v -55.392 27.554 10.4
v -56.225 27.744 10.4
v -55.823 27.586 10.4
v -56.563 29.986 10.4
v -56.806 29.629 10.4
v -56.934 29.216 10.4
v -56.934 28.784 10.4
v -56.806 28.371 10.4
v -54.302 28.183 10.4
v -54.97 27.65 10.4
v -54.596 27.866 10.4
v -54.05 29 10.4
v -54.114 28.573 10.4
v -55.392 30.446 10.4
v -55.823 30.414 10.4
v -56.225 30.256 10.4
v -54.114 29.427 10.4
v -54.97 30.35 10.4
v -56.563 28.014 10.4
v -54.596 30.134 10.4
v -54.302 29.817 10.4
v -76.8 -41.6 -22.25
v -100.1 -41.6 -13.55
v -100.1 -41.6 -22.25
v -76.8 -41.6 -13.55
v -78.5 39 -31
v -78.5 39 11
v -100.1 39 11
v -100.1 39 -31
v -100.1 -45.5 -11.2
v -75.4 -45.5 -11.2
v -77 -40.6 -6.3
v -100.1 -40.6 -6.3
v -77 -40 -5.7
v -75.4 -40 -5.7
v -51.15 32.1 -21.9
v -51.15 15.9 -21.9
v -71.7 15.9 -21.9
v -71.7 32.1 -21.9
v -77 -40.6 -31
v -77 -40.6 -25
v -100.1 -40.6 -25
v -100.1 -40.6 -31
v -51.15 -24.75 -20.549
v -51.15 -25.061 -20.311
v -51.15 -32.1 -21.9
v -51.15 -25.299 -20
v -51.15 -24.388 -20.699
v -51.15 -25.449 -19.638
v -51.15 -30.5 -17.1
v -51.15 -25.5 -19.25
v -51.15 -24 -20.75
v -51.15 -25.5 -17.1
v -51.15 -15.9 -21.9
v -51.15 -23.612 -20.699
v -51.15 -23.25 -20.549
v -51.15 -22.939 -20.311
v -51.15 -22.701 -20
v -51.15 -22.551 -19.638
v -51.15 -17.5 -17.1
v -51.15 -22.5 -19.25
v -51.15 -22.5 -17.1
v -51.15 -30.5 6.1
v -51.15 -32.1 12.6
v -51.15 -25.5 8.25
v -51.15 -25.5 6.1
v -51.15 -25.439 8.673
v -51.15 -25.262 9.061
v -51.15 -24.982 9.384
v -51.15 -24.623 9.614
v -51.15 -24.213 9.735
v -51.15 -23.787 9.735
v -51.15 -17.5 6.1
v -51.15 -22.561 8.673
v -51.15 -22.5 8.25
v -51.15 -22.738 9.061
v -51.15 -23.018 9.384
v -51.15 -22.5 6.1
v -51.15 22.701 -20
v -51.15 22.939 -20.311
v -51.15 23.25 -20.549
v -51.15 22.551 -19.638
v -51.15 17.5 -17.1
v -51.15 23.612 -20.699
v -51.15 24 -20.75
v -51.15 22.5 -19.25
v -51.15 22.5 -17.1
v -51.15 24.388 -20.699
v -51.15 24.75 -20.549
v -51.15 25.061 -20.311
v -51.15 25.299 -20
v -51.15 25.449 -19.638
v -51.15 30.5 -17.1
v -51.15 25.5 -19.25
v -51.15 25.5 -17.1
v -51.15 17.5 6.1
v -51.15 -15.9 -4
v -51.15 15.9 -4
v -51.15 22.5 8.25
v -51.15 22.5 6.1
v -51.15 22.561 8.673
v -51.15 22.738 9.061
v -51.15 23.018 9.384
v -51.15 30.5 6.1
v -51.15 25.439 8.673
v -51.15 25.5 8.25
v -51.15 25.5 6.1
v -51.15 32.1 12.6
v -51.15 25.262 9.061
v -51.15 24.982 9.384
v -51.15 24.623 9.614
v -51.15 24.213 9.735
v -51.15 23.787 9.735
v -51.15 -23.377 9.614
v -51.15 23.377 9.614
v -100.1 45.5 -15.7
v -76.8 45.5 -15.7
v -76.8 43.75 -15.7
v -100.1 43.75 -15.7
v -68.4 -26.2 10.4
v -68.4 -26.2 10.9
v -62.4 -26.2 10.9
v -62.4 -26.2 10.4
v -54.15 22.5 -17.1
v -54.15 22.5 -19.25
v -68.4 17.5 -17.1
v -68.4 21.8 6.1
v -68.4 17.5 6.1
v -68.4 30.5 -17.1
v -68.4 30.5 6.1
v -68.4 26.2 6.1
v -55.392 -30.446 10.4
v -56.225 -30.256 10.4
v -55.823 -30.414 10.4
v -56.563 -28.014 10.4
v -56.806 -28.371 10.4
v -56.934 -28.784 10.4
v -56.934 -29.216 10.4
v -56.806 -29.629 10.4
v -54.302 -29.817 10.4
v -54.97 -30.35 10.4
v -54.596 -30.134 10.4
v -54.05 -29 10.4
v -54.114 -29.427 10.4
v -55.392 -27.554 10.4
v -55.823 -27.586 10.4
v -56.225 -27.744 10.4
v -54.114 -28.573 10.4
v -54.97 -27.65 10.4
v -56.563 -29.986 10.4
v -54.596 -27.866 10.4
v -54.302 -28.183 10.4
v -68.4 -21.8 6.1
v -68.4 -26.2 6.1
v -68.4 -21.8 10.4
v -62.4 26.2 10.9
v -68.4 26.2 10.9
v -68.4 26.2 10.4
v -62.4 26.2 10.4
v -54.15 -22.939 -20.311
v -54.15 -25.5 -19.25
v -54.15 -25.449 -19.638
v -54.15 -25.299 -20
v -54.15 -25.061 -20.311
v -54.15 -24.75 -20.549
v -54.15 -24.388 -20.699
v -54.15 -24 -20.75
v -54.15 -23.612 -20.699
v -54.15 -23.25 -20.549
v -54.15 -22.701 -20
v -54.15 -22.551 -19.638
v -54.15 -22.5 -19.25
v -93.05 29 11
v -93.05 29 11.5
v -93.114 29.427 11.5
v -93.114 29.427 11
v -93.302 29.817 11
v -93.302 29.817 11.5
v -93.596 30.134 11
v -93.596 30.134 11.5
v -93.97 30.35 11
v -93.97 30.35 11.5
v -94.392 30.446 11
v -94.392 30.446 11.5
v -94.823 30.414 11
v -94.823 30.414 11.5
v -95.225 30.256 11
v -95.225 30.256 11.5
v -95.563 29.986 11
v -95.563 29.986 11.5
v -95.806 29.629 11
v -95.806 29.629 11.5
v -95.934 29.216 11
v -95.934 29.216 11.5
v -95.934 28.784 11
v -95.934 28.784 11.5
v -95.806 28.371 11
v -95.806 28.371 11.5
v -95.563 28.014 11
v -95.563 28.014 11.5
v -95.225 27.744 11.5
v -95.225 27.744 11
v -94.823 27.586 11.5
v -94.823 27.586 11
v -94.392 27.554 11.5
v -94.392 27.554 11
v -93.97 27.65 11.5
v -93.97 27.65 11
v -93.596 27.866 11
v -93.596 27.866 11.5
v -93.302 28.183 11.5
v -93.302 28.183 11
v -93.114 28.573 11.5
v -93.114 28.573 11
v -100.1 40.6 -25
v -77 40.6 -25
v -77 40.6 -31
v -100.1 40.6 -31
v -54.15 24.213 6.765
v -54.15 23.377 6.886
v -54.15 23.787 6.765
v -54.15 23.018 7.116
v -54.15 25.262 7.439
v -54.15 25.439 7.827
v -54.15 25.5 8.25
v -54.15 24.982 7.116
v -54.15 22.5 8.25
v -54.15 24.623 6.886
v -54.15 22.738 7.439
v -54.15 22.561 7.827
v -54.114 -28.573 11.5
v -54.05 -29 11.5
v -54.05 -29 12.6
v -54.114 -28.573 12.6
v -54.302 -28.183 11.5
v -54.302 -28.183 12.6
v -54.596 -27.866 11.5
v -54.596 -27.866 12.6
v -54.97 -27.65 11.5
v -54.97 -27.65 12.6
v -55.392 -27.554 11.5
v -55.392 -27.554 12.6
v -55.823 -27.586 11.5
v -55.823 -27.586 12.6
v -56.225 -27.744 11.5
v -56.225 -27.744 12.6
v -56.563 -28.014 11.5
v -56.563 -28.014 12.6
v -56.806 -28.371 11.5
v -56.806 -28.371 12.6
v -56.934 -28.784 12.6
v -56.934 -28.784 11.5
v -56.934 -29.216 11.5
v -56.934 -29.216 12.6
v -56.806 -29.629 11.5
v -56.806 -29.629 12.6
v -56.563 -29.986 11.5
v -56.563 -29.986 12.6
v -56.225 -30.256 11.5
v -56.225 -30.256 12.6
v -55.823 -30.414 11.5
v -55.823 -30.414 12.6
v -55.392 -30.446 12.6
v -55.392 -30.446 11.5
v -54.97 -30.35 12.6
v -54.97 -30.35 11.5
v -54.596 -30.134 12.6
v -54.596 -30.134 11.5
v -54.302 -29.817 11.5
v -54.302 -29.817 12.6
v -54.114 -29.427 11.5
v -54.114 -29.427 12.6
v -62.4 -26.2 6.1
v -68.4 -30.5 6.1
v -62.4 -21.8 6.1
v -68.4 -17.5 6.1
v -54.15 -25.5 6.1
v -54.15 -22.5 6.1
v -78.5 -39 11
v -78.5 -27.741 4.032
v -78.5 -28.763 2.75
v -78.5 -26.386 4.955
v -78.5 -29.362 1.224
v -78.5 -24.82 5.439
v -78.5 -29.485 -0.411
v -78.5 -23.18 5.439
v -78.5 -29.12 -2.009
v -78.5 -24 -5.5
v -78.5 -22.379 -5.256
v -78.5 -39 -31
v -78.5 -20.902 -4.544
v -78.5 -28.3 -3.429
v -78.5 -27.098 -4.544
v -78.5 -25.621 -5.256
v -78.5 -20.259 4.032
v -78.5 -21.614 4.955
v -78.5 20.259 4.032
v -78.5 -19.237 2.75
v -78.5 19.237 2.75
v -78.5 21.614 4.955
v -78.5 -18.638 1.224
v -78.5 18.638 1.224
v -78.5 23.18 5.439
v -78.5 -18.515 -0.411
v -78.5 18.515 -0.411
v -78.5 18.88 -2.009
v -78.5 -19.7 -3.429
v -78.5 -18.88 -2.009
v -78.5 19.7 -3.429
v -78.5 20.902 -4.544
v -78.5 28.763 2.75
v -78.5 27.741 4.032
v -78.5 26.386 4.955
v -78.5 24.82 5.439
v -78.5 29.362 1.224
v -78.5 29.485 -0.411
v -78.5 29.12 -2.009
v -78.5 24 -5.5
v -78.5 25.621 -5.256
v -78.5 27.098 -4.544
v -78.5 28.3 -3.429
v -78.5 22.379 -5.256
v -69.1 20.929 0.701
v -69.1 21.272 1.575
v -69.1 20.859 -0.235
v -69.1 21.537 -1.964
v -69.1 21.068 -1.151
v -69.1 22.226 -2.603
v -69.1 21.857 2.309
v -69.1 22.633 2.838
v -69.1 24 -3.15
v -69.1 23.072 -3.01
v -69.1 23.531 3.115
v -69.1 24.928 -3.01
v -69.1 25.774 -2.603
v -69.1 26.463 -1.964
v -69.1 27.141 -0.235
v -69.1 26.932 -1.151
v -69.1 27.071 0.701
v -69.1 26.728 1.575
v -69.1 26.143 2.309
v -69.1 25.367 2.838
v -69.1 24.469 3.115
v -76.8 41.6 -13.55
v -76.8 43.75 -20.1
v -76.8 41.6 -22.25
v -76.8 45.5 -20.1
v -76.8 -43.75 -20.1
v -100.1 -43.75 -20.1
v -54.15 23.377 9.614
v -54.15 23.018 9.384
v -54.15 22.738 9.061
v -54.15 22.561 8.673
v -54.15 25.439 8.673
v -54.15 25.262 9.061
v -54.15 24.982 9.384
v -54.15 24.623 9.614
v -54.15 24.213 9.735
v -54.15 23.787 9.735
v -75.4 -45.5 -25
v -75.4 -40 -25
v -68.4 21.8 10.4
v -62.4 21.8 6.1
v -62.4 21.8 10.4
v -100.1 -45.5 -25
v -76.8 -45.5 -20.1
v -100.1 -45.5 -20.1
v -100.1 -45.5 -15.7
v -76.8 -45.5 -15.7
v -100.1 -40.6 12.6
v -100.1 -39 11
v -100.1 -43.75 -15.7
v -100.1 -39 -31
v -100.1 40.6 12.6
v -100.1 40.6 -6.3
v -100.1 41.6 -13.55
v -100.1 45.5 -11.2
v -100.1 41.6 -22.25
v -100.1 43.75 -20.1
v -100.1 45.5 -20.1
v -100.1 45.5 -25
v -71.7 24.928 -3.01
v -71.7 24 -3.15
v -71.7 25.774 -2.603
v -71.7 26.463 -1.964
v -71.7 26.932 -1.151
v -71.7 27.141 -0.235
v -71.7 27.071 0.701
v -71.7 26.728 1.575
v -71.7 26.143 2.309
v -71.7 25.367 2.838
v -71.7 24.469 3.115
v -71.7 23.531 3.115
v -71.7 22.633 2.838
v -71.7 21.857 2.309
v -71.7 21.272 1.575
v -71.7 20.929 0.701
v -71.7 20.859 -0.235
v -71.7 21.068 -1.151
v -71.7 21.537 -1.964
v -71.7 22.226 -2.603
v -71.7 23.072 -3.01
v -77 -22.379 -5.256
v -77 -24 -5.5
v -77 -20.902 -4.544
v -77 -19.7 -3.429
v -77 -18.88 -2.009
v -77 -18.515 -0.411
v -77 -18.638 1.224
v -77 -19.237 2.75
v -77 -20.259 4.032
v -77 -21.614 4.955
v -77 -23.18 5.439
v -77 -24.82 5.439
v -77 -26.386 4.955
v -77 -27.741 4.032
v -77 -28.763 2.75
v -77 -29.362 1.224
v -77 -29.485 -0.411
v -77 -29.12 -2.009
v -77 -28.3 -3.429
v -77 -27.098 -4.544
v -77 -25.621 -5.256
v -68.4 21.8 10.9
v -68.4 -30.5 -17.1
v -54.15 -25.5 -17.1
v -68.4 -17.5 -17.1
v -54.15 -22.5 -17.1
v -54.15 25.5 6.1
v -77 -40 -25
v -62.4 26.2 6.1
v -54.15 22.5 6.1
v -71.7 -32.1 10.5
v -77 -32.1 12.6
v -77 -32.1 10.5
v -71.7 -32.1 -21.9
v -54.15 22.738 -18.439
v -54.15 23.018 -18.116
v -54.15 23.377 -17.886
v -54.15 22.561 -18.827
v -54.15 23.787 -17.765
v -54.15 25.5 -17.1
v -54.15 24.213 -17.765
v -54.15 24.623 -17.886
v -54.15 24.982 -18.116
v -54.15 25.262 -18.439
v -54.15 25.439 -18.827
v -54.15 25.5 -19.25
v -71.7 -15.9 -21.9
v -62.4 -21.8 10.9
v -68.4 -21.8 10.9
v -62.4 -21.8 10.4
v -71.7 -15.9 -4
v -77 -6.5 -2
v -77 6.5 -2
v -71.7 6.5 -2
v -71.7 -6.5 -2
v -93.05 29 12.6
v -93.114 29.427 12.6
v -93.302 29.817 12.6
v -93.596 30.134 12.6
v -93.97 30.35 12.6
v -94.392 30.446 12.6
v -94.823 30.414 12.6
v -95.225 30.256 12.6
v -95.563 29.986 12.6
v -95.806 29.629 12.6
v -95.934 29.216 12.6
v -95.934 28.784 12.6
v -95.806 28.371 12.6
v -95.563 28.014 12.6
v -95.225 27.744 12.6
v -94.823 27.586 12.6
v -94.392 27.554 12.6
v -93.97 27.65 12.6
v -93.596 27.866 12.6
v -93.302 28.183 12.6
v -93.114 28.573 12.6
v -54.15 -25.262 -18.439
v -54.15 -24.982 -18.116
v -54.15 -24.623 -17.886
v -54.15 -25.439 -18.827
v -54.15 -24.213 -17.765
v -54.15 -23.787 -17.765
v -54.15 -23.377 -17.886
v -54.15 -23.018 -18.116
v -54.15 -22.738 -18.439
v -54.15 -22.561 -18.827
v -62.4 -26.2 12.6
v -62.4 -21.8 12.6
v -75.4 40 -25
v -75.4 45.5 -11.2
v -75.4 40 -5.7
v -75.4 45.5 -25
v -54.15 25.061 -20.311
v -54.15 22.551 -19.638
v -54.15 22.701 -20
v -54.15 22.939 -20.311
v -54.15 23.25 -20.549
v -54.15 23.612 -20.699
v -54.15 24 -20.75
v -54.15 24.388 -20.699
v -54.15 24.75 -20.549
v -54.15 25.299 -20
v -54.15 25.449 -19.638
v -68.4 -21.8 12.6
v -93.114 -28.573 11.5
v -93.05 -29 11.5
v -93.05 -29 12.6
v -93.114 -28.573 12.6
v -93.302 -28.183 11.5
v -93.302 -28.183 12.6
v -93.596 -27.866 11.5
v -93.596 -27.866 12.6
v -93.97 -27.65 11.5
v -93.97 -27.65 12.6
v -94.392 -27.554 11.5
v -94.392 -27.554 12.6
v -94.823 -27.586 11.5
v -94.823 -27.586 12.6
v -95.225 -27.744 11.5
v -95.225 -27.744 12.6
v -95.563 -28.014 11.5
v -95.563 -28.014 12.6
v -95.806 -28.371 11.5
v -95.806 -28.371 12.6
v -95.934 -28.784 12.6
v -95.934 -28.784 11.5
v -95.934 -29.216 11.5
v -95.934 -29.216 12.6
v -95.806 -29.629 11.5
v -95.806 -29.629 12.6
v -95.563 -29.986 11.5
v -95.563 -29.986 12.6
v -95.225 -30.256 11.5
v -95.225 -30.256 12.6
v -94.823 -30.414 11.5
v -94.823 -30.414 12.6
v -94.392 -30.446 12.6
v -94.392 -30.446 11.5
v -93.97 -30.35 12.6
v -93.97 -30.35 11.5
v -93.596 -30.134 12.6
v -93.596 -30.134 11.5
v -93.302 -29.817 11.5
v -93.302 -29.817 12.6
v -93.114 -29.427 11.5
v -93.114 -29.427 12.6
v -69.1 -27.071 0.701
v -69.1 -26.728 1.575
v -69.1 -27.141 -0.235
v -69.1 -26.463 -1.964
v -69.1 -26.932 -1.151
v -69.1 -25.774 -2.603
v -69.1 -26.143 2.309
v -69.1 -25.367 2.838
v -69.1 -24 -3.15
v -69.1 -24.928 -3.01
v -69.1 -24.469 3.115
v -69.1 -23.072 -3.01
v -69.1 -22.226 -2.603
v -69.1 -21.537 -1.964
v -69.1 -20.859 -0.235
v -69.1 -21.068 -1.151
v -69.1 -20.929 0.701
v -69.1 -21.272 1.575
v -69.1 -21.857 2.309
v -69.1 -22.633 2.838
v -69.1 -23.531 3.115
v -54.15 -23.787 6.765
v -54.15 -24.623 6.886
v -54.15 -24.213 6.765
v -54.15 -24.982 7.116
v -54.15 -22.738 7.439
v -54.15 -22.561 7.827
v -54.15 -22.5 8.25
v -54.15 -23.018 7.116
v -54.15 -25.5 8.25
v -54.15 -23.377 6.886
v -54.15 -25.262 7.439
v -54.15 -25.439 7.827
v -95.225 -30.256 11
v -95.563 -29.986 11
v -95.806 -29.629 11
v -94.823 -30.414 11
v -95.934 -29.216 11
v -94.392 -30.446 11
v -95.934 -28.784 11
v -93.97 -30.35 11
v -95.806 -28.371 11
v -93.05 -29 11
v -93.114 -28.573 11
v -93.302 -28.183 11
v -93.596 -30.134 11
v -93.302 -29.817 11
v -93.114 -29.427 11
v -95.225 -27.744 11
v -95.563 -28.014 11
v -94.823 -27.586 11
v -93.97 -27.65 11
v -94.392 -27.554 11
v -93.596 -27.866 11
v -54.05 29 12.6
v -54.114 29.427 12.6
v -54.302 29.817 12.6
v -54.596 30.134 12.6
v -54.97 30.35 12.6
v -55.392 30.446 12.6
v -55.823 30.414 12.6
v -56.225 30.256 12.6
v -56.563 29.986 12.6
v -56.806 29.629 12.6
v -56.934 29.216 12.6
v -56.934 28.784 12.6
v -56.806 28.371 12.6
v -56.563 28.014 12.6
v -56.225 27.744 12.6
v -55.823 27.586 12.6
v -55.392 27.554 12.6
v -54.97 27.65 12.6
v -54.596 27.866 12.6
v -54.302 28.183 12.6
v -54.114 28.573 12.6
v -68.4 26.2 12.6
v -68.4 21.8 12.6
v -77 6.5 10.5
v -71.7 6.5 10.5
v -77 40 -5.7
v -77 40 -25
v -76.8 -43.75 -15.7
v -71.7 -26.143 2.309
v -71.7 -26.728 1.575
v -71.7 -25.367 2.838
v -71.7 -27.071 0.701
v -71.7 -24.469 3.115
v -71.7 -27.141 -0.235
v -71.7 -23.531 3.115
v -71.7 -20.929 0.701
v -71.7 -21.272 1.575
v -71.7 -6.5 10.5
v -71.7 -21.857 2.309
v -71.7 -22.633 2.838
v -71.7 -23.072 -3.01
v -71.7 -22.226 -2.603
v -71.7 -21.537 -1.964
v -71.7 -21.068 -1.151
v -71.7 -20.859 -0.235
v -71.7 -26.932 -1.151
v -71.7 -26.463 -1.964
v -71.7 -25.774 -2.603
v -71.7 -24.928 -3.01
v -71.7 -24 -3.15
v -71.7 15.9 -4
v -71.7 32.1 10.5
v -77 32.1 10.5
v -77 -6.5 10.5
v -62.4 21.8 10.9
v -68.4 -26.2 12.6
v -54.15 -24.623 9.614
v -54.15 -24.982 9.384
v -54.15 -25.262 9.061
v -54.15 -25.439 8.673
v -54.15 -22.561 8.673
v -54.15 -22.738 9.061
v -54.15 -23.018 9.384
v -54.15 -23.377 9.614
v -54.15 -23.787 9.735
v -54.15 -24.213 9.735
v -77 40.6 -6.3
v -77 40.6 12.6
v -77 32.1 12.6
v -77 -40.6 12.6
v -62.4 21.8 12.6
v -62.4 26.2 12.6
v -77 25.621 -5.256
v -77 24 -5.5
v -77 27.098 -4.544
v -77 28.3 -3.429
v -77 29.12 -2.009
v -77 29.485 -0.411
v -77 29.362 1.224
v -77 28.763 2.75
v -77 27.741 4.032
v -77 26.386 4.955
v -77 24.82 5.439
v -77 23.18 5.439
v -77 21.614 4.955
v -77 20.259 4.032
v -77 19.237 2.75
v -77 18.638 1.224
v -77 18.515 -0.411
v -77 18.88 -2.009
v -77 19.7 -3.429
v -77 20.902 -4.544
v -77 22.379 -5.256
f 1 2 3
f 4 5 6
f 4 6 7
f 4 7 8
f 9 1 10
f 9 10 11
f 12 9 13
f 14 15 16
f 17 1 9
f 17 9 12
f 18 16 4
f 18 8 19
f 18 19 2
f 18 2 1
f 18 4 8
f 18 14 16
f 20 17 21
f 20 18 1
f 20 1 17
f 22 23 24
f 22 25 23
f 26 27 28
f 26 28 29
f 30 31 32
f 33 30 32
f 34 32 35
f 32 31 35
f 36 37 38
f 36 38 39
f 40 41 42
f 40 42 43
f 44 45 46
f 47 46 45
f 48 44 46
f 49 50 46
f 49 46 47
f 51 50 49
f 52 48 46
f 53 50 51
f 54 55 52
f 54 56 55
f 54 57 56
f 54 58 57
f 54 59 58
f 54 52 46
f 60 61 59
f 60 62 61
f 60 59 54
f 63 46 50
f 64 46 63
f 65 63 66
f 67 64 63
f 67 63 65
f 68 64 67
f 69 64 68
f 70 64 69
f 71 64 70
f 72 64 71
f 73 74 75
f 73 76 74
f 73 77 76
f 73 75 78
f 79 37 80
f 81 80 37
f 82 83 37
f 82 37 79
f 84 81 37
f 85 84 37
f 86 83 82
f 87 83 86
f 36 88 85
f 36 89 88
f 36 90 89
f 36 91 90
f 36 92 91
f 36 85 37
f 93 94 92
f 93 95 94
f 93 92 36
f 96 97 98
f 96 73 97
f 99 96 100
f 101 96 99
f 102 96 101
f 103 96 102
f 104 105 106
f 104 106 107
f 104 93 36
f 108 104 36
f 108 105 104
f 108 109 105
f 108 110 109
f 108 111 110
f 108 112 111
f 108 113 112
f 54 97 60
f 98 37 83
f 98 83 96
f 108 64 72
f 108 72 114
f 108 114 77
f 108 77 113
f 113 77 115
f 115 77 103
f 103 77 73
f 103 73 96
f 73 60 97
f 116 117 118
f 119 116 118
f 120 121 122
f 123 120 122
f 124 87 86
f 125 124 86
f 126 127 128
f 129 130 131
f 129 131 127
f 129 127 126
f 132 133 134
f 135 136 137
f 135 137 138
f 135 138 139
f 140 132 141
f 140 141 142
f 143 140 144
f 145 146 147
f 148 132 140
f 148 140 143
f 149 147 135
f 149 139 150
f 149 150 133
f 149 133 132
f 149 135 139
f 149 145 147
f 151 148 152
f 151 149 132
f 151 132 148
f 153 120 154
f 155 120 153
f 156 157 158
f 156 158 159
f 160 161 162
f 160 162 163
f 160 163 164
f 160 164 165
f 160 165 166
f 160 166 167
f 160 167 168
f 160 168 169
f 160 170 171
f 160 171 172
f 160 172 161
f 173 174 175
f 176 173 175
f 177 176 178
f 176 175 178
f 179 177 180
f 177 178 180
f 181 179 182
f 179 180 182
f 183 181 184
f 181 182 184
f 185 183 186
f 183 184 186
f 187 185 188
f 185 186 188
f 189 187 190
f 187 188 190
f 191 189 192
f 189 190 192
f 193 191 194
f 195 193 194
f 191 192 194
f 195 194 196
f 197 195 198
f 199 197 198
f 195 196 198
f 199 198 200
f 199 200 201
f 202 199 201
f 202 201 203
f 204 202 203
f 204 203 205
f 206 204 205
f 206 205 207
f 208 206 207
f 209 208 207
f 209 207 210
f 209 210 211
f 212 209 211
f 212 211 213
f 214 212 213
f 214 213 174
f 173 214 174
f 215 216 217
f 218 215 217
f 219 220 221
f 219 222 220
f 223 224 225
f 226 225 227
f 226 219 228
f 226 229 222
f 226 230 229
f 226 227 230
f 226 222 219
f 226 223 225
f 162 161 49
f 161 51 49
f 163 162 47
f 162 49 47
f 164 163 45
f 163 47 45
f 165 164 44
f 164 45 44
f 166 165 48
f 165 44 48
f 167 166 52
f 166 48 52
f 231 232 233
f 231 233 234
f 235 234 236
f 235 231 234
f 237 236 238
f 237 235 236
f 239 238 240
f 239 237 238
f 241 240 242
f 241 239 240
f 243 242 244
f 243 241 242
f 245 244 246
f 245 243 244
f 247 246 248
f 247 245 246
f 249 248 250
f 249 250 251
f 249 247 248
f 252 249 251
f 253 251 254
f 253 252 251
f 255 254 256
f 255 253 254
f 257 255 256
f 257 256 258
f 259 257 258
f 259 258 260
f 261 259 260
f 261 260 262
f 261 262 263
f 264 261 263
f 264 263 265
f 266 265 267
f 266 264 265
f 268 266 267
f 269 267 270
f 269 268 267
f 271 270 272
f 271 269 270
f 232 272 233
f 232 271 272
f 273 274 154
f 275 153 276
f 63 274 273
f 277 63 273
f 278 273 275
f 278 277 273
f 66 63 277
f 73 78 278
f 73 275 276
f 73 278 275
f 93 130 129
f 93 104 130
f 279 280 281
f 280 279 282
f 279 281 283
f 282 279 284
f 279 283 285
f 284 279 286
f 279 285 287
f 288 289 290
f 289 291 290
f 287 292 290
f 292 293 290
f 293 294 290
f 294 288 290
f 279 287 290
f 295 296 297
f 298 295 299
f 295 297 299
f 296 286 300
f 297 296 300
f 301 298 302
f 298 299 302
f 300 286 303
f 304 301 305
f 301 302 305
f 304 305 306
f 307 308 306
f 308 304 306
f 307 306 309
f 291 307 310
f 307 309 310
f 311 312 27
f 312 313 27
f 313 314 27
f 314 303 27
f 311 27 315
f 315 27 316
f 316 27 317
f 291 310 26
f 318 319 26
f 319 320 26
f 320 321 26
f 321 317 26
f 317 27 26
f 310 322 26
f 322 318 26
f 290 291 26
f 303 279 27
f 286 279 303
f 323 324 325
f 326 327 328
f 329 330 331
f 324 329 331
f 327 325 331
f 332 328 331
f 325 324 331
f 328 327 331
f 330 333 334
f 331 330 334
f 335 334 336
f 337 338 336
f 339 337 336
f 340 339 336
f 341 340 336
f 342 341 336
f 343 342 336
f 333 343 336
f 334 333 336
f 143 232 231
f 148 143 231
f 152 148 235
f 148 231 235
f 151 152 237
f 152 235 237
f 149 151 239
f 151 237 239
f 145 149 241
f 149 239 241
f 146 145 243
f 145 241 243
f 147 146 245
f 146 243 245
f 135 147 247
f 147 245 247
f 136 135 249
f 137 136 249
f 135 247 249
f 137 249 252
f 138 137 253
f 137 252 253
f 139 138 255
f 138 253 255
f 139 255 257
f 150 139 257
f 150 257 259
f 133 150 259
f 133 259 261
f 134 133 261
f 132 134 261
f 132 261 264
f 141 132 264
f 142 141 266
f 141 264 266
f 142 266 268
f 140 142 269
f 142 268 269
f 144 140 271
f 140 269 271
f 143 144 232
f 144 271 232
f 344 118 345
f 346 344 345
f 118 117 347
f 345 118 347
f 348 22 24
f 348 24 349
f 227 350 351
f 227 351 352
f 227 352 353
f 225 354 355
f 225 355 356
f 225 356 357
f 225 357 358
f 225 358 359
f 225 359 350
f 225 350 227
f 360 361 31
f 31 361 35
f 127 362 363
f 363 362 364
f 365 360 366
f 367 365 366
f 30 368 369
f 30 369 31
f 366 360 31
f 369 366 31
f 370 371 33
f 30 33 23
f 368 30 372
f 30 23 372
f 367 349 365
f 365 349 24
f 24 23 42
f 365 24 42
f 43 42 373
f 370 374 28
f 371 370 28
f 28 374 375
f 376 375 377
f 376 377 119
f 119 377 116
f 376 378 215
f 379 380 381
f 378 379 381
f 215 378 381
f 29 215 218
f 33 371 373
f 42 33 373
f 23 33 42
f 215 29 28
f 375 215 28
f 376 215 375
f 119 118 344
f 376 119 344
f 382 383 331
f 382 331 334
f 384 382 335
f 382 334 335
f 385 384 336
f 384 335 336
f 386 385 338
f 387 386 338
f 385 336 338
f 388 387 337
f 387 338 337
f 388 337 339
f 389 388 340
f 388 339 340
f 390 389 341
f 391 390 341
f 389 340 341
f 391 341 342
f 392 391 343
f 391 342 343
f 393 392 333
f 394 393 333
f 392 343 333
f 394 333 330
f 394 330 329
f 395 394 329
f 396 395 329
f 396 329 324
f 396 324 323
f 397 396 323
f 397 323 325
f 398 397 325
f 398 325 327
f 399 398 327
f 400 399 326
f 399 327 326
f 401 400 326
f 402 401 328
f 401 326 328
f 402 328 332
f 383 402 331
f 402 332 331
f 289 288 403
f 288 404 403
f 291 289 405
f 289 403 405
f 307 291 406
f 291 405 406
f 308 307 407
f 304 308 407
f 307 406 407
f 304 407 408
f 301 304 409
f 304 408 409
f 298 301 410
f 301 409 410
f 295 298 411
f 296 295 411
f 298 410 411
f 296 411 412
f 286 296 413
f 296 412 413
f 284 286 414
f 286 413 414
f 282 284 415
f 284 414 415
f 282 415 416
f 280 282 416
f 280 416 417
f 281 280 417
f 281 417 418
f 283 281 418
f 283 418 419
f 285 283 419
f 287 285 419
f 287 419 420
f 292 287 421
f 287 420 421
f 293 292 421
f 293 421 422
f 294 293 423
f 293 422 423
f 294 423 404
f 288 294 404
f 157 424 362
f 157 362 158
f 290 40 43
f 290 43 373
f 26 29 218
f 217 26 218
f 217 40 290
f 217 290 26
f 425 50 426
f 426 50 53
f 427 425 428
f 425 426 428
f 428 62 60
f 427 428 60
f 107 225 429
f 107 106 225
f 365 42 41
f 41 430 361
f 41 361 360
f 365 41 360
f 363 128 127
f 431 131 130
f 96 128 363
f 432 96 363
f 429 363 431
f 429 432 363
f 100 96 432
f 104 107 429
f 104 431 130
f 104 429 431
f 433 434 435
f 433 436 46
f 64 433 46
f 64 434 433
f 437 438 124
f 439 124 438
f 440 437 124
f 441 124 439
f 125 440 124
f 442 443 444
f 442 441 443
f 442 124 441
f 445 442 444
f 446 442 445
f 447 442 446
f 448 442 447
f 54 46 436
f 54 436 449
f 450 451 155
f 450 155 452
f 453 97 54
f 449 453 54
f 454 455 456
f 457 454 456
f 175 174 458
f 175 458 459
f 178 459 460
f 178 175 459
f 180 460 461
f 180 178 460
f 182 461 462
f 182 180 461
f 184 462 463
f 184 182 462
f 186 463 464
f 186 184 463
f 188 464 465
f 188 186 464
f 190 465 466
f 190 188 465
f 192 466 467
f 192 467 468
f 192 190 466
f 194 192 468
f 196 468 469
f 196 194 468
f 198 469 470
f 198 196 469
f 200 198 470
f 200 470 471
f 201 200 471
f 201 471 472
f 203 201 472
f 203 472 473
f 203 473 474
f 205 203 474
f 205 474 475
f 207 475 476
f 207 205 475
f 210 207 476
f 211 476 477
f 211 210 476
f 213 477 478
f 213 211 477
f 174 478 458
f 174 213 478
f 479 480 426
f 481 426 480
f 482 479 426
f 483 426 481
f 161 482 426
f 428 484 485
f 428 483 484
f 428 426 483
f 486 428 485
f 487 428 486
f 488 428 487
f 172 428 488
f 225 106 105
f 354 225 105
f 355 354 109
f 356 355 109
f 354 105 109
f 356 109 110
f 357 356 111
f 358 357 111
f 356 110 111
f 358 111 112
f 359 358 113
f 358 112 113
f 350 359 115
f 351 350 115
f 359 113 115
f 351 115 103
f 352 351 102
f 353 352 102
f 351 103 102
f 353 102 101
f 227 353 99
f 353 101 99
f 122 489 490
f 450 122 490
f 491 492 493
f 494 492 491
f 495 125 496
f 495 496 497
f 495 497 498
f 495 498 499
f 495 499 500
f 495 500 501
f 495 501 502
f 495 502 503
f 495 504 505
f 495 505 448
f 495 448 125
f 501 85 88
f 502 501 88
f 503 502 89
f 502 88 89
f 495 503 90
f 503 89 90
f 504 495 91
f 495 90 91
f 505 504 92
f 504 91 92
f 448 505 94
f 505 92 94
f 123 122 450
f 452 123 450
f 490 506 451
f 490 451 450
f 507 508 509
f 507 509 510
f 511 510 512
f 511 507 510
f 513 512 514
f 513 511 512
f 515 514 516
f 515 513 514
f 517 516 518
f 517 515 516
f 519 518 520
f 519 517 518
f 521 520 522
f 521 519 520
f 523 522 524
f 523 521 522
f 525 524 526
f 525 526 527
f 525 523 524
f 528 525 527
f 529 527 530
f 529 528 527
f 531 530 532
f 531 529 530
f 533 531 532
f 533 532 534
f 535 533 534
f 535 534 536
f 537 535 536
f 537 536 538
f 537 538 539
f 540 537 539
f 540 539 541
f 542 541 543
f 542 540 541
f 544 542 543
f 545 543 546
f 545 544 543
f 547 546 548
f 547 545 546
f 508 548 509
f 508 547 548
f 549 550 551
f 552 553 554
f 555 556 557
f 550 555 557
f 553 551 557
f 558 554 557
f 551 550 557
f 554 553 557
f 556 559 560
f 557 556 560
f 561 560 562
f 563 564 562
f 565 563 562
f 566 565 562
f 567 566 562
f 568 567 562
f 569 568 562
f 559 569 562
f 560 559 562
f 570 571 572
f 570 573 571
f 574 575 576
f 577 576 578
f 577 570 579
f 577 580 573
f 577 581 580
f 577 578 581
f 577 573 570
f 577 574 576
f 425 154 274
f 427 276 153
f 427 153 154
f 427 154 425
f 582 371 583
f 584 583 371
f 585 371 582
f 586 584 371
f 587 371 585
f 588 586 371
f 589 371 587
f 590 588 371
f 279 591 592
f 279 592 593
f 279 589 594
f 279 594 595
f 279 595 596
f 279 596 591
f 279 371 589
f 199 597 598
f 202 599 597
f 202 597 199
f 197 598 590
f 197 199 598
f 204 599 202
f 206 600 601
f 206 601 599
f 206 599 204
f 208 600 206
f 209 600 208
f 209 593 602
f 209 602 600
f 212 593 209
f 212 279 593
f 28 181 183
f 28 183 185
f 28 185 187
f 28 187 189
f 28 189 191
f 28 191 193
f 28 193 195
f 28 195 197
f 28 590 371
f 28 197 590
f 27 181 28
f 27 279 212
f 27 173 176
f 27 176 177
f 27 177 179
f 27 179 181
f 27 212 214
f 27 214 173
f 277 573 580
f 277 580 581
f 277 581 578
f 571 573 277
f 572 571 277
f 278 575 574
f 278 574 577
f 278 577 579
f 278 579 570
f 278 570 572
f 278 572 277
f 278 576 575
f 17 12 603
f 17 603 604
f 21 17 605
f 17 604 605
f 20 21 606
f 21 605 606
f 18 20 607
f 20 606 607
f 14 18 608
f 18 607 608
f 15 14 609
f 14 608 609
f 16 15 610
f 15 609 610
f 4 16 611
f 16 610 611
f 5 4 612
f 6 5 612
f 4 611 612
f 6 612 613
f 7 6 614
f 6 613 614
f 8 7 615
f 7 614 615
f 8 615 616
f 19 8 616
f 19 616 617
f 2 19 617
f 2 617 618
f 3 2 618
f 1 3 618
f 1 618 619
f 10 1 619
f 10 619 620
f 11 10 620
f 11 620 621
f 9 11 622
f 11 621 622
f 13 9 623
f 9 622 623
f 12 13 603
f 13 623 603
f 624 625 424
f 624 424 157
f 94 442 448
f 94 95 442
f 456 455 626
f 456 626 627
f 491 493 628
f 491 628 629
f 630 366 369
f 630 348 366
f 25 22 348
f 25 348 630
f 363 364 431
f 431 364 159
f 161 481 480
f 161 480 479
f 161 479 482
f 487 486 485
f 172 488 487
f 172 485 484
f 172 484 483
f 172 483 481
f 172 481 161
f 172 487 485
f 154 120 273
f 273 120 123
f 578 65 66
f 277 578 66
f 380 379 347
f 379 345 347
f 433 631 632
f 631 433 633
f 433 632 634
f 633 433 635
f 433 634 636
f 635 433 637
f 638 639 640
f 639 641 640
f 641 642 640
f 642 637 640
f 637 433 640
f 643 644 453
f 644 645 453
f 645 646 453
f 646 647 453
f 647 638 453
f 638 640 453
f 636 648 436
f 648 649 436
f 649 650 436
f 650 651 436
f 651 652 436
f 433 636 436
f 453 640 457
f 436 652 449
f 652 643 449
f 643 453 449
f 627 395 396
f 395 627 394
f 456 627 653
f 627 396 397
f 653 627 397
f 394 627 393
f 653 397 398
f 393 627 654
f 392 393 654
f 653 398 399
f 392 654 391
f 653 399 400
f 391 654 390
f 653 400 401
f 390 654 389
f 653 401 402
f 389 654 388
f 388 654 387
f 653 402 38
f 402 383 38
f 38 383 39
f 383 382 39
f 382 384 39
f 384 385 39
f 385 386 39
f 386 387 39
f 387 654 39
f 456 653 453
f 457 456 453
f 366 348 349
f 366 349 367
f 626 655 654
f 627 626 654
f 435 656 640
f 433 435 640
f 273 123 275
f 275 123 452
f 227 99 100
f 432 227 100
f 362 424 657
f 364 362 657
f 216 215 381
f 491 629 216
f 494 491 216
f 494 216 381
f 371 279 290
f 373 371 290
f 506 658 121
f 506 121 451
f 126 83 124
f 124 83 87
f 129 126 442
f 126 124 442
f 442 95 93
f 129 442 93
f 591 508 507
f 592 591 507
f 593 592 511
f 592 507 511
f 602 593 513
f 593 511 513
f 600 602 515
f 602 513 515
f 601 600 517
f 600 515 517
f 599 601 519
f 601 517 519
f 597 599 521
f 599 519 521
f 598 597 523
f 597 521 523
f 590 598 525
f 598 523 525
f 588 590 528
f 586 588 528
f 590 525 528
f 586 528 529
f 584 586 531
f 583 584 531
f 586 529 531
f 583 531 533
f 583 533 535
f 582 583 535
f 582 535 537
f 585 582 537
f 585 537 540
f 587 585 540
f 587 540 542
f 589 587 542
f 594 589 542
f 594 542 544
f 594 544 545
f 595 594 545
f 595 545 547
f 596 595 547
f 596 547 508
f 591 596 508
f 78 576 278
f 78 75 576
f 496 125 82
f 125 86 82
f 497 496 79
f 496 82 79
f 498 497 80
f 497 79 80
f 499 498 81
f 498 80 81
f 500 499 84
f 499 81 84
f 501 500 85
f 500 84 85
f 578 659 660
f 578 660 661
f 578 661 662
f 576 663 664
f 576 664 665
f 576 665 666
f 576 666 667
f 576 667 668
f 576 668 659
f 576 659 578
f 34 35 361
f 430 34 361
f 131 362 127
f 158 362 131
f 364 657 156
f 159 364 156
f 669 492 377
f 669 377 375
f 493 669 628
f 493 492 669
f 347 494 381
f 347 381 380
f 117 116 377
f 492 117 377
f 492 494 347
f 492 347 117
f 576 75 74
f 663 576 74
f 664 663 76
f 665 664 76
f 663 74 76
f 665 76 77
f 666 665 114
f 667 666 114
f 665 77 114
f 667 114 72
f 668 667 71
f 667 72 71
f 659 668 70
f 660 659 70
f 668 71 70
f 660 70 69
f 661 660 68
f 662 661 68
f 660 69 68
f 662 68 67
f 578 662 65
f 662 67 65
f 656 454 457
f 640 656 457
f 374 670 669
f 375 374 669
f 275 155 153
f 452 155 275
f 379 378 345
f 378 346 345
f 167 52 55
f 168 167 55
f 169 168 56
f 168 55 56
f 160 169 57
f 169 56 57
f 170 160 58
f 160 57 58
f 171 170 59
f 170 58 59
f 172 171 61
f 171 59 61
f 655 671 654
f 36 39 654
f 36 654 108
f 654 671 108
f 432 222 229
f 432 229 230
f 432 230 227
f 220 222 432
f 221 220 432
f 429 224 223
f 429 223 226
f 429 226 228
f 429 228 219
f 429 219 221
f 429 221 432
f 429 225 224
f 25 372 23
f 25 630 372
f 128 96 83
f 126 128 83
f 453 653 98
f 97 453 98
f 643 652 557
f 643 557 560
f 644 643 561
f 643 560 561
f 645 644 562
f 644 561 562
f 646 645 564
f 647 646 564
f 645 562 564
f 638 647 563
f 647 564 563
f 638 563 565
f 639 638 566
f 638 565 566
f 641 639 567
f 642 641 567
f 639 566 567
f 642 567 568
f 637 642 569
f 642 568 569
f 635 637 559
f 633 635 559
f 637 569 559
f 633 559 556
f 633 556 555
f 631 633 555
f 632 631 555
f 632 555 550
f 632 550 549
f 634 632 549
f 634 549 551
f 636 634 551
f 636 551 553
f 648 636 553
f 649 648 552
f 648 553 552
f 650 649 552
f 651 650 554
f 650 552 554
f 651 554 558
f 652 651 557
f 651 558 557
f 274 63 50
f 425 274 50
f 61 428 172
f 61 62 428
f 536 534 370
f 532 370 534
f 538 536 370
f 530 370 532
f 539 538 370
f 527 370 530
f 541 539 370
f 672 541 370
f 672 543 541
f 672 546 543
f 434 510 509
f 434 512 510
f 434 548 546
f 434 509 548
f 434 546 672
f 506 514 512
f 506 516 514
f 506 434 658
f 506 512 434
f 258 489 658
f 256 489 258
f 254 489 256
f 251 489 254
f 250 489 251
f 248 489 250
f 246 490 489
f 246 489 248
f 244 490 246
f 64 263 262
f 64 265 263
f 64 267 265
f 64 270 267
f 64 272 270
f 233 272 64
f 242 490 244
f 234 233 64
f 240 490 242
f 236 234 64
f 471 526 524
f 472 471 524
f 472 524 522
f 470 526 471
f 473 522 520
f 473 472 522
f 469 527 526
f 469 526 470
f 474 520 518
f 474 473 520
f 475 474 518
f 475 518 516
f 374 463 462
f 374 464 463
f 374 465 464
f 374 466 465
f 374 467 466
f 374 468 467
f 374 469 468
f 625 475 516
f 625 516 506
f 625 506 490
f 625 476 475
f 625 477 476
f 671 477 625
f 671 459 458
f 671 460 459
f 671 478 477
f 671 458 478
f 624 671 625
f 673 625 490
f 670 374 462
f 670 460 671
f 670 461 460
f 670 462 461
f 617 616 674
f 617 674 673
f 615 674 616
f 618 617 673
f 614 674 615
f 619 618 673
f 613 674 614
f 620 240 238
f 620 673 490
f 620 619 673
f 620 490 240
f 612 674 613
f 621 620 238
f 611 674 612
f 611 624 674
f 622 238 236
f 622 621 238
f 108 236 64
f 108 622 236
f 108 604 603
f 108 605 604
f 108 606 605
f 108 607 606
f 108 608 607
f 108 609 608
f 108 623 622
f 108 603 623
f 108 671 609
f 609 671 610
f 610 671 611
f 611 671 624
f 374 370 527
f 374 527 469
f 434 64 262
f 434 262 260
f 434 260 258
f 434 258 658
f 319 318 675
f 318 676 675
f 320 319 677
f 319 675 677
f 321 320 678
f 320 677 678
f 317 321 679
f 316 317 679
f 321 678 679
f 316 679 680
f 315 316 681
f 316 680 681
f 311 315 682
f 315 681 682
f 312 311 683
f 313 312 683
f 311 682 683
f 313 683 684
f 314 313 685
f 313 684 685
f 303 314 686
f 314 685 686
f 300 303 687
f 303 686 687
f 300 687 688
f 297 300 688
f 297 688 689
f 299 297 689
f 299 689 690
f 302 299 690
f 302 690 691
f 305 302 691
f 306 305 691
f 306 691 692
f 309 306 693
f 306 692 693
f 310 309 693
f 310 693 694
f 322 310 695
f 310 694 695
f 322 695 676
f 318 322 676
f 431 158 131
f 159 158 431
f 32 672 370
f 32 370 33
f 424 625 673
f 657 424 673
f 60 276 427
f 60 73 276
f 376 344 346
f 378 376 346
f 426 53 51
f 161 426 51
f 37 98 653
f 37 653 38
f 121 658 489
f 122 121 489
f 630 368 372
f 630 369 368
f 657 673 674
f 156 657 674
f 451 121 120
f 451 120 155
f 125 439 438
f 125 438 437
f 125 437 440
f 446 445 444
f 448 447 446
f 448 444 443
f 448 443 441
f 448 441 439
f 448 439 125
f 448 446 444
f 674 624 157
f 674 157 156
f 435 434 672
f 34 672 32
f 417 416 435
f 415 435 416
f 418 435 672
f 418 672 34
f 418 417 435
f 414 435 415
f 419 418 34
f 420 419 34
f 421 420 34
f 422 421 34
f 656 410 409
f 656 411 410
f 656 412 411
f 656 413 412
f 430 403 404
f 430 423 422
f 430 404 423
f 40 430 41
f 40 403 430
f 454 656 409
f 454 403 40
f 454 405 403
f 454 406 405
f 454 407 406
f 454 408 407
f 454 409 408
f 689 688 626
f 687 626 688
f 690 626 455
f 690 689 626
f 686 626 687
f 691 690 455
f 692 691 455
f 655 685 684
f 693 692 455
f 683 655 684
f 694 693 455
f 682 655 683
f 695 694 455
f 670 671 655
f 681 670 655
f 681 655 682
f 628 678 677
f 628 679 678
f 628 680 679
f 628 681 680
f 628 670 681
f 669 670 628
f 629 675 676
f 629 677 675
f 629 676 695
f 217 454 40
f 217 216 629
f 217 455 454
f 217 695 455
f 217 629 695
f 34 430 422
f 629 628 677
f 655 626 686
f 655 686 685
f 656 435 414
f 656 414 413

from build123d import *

# Parameters (mm, degrees)
BOSS_EXTRUDE1_START = -88.55
SKETCH1_W           = 43.6
SKETCH1_H           = 81.2
BOSS_EXTRUDE1_DEPTH = 11.55
BOSS_EXTRUDE2_START = 3.45
SKETCH2_W           = 20.55
SKETCH2_H           = 33
BOSS_EXTRUDE2_DEPTH = 7.45
BOSS_EXTRUDE3_START = 4.45
SKETCH3_W           = 6.3
SKETCH3_H           = 13
BOSS_EXTRUDE3_DEPTH = 6.45
BOSS_EXTRUDE4_START = 11.55
SKETCH4_W           = 26.85
SKETCH4_H           = 64.2
BOSS_EXTRUDE4_DEPTH = 1.05
BOSS_EXTRUDE5_START = -61.425
SKETCH5_W           = 32.8
SKETCH5_H           = 16.2
BOSS_EXTRUDE5_DEPTH = 10.275
BOSS_EXTRUDE6_START = -87.75
BOSS_EXTRUDE6_DEPTH = 12.35
BOSS_EXTRUDE7_START = -61.425
SKETCH7_W           = 32.8
SKETCH7_H           = 16.2
BOSS_EXTRUDE7_DEPTH = 10.275
BOSS_EXTRUDE8_START = -87.75
BOSS_EXTRUDE8_DEPTH = 12.35
CUT_EXTRUDE1_START  = -89.3
SKETCH9_W           = 43
SKETCH9_H           = 78
CUT_EXTRUDE1_DEPTH  = 10.8
CUT_EXTRUDE2_START  = 11.5
SKETCH10_R          = 1.45
CUT_EXTRUDE2_DEPTH  = 1.1
CUT_EXTRUDE3_START  = -88.45
CUT_EXTRUDE3_DEPTH  = 11.65
CUT_EXTRUDE4_START  = -59.775
SKETCH12_W          = 23.2
SKETCH12_H          = 13
CUT_EXTRUDE4_DEPTH  = 8.625
CUT_EXTRUDE5_START  = -52.65
SKETCH13_R          = 1.5
CUT_EXTRUDE5_DEPTH  = 1.5
CUT_EXTRUDE6_START  = -52.65
SKETCH14_W          = 2.15
SKETCH14_H          = 3
CUT_EXTRUDE6_DEPTH  = 1.5
CUT_EXTRUDE7_START  = -52.65
SKETCH15_R          = 1.5
CUT_EXTRUDE7_DEPTH  = 1.5
CUT_EXTRUDE8_START  = -52.65
SKETCH16_W          = 2.15
SKETCH16_H          = 3
CUT_EXTRUDE8_DEPTH  = 1.5
CUT_EXTRUDE9_START  = -70.4
SKETCH17_R          = 3.15
CUT_EXTRUDE9_DEPTH  = 1.3
CUT_EXTRUDE10_START = 8.5
SKETCH18_W          = 6
SKETCH18_H          = 4.4
CUT_EXTRUDE10_DEPTH = 2.4
CUT_EXTRUDE11_START = 11.5
SKETCH19_W          = 6
SKETCH19_H          = 4.4
CUT_EXTRUDE11_DEPTH = 1.1
CUT_EXTRUDE12_START = -77.75
SKETCH20_R          = 5.5
CUT_EXTRUDE12_DEPTH = 0.75
CUT_EXTRUDE13_START = -88.45
CUT_EXTRUDE13_DEPTH = 11.65
CUT_EXTRUDE14_START = -59.775
SKETCH22_W          = 23.2
SKETCH22_H          = 13
CUT_EXTRUDE14_DEPTH = 8.625
CUT_EXTRUDE15_START = -52.65
SKETCH23_R          = 1.5
CUT_EXTRUDE15_DEPTH = 1.5
CUT_EXTRUDE16_START = -52.65
SKETCH24_W          = 2.15
SKETCH24_H          = 3
CUT_EXTRUDE16_DEPTH = 1.5
CUT_EXTRUDE17_START = -52.65
SKETCH25_R          = 1.5
CUT_EXTRUDE17_DEPTH = 1.5
CUT_EXTRUDE18_START = -52.65
SKETCH26_W          = 2.15
SKETCH26_H          = 3
CUT_EXTRUDE18_DEPTH = 1.5
CUT_EXTRUDE19_START = -70.4
SKETCH27_R          = 3.15
CUT_EXTRUDE19_DEPTH = 1.3
CUT_EXTRUDE20_START = 8.5
SKETCH28_W          = 6
SKETCH28_H          = 4.4
CUT_EXTRUDE20_DEPTH = 2.4
CUT_EXTRUDE21_START = 11.5
SKETCH29_W          = 6
SKETCH29_H          = 4.4
CUT_EXTRUDE21_DEPTH = 1.1
CUT_EXTRUDE22_START = -77.75
SKETCH30_R          = 5.5
CUT_EXTRUDE22_DEPTH = 0.75


with BuildPart() as part:
    # Sketch1 → Boss-Extrude1 (new, symmetric)
    with BuildSketch(Plane(origin=(0, 0, 0), x_dir=(0, 0, -1), z_dir=(1, 0, 0)).offset(BOSS_EXTRUDE1_START)):
        with Locations((9.2, 0)):
            Rectangle(SKETCH1_W, SKETCH1_H)
    extrude(amount=BOSS_EXTRUDE1_DEPTH, both=True)



with BuildPart() as body_2:
    # Sketch2 → Boss-Extrude2 (new, symmetric)
    with BuildSketch(Plane.XY.offset(BOSS_EXTRUDE2_START)):
        with Locations((-61.425, 0)):
            Rectangle(SKETCH2_W, SKETCH2_H)
    extrude(amount=BOSS_EXTRUDE2_DEPTH, both=True)


with BuildPart() as part_1:
    add(part.part)

    add(body_2.part)  # Boss-Extrude3 merges body 2
    # Sketch3 → Boss-Extrude3 (add, symmetric)
    with BuildSketch(Plane.XY.offset(BOSS_EXTRUDE3_START)):
        with Locations((-74.85, 0)):
            Rectangle(SKETCH3_W, SKETCH3_H)
    extrude(amount=BOSS_EXTRUDE3_DEPTH, both=True)

    # Sketch4 → Boss-Extrude4 (add, symmetric)
    with BuildSketch(Plane.XY.offset(BOSS_EXTRUDE4_START)):
        with Locations((-64.575, 0)):
            Rectangle(SKETCH4_W, SKETCH4_H)
    extrude(amount=BOSS_EXTRUDE4_DEPTH, both=True)

    # Sketch5 → Boss-Extrude5 (add, symmetric)
    with BuildSketch(Plane(origin=(0, 0, 0), x_dir=(0, 0, -1), z_dir=(1, 0, 0)).offset(BOSS_EXTRUDE5_START)):
        with Locations((5.5, 24)):
            Rectangle(SKETCH5_W, SKETCH5_H)
    extrude(amount=BOSS_EXTRUDE5_DEPTH, both=True)

    # Sketch6 → Boss-Extrude6 (add, symmetric)
    with BuildSketch(Plane(origin=(0, 0, 0), x_dir=(0, 0, -1), z_dir=(1, 0, 0)).offset(BOSS_EXTRUDE6_START)):
        Polygon((25, 40), (25, 45.5), (11.2, 45.5), (5.7, 40), align=None)
    extrude(amount=BOSS_EXTRUDE6_DEPTH, both=True)

    # Sketch7 → Boss-Extrude7 (add, symmetric)
    with BuildSketch(Plane(origin=(0, 0, 0), x_dir=(0, 0, -1), z_dir=(1, 0, 0)).offset(BOSS_EXTRUDE7_START)):
        with Locations((5.5, -24)):
            Rectangle(SKETCH7_W, SKETCH7_H)
    extrude(amount=BOSS_EXTRUDE7_DEPTH, both=True)

    # Sketch8 → Boss-Extrude8 (add, symmetric)
    with BuildSketch(Plane(origin=(0, 0, 0), x_dir=(0, 0, -1), z_dir=(1, 0, 0)).offset(BOSS_EXTRUDE8_START)):
        Polygon((25, -40), (25, -45.5), (11.2, -45.5), (5.7, -40), align=None)
    extrude(amount=BOSS_EXTRUDE8_DEPTH, both=True)

    # Sketch9 → Cut-Extrude1 (cut, symmetric)
    with BuildSketch(Plane(origin=(0, 0, 0), x_dir=(0, 0, -1), z_dir=(1, 0, 0)).offset(CUT_EXTRUDE1_START)):
        with Locations((10.5, 0)):
            Rectangle(SKETCH9_W, SKETCH9_H)
    extrude(amount=CUT_EXTRUDE1_DEPTH, both=True, mode=Mode.SUBTRACT)

    # Sketch10 → Cut-Extrude2 (cut, symmetric)
    with BuildSketch(Plane.XY.offset(CUT_EXTRUDE2_START)):
        with Locations((-94.5, -29)):
            Circle(SKETCH10_R)
        with Locations((-94.5, 29)):
            Circle(SKETCH10_R)
        with Locations((-55.5, -29)):
            Circle(SKETCH10_R)
        with Locations((-55.5, 29)):
            Circle(SKETCH10_R)
    extrude(amount=CUT_EXTRUDE2_DEPTH, both=True, mode=Mode.SUBTRACT)

    # Sketch11 → Cut-Extrude3 (cut, symmetric)
    with BuildSketch(Plane(origin=(0, 0, 0), x_dir=(0, 0, -1), z_dir=(1, 0, 0)).offset(CUT_EXTRUDE3_START)):
        Polygon((20.1, 45.5), (15.7, 45.5), (15.7, 43.75), (13.55, 41.6), (22.25, 41.6), (20.1, 43.75), align=None)
    extrude(amount=CUT_EXTRUDE3_DEPTH, both=True, mode=Mode.SUBTRACT)

    # Sketch12 → Cut-Extrude4 (cut, symmetric)
    with BuildSketch(Plane(origin=(0, 0, 0), x_dir=(0, 0, -1), z_dir=(1, 0, 0)).offset(CUT_EXTRUDE4_START)):
        with Locations((5.5, 24)):
            Rectangle(SKETCH12_W, SKETCH12_H)
    extrude(amount=CUT_EXTRUDE4_DEPTH, both=True, mode=Mode.SUBTRACT)

    # Sketch13 → Cut-Extrude5 (cut, symmetric)
    with BuildSketch(Plane(origin=(0, 0, 0), x_dir=(0, 0, -1), z_dir=(1, 0, 0)).offset(CUT_EXTRUDE5_START)):
        with Locations((19.25, 24)):
            Circle(SKETCH13_R)
    extrude(amount=CUT_EXTRUDE5_DEPTH, both=True, mode=Mode.SUBTRACT)

    # Sketch14 → Cut-Extrude6 (cut, symmetric)
    with BuildSketch(Plane(origin=(0, 0, 0), x_dir=(0, 0, -1), z_dir=(1, 0, 0)).offset(CUT_EXTRUDE6_START)):
        with Locations((18.175, 24)):
            Rectangle(SKETCH14_W, SKETCH14_H)
    extrude(amount=CUT_EXTRUDE6_DEPTH, both=True, mode=Mode.SUBTRACT)

    # Sketch15 → Cut-Extrude7 (cut, symmetric)
    with BuildSketch(Plane(origin=(0, 0, 0), x_dir=(0, 0, -1), z_dir=(1, 0, 0)).offset(CUT_EXTRUDE7_START)):
        with Locations((-8.25, 24)):
            Circle(SKETCH15_R)
    extrude(amount=CUT_EXTRUDE7_DEPTH, both=True, mode=Mode.SUBTRACT)

    # Sketch16 → Cut-Extrude8 (cut, symmetric)
    with BuildSketch(Plane(origin=(0, 0, 0), x_dir=(0, 0, -1), z_dir=(1, 0, 0)).offset(CUT_EXTRUDE8_START)):
        with Locations((-7.175, 24)):
            Rectangle(SKETCH16_W, SKETCH16_H)
    extrude(amount=CUT_EXTRUDE8_DEPTH, both=True, mode=Mode.SUBTRACT)

    # Sketch17 → Cut-Extrude9 (cut, symmetric)
    with BuildSketch(Plane(origin=(0, 0, 0), x_dir=(0, 0, -1), z_dir=(1, 0, 0)).offset(CUT_EXTRUDE9_START)):
        with Locations((0, 24)):
            Circle(SKETCH17_R)
    extrude(amount=CUT_EXTRUDE9_DEPTH, both=True, mode=Mode.SUBTRACT)

    # Sketch18 → Cut-Extrude10 (cut, symmetric)
    with BuildSketch(Plane.XY.offset(CUT_EXTRUDE10_START)):
        with Locations((-65.4, 24)):
            Rectangle(SKETCH18_W, SKETCH18_H)
    extrude(amount=CUT_EXTRUDE10_DEPTH, both=True, mode=Mode.SUBTRACT)

    # Sketch19 → Cut-Extrude11 (cut, symmetric)
    with BuildSketch(Plane.XY.offset(CUT_EXTRUDE11_START)):
        with Locations((-65.4, 24)):
            Rectangle(SKETCH19_W, SKETCH19_H)
    extrude(amount=CUT_EXTRUDE11_DEPTH, both=True, mode=Mode.SUBTRACT)

    # Sketch20 → Cut-Extrude12 (cut, symmetric)
    with BuildSketch(Plane(origin=(0, 0, 0), x_dir=(0, 0, -1), z_dir=(1, 0, 0)).offset(CUT_EXTRUDE12_START)):
        with Locations((0, 24)):
            Circle(SKETCH20_R)
    extrude(amount=CUT_EXTRUDE12_DEPTH, both=True, mode=Mode.SUBTRACT)

    # Sketch21 → Cut-Extrude13 (cut, symmetric)
    with BuildSketch(Plane(origin=(0, 0, 0), x_dir=(0, 0, -1), z_dir=(1, 0, 0)).offset(CUT_EXTRUDE13_START)):
        Polygon((20.1, -45.5), (15.7, -45.5), (15.7, -43.75), (13.55, -41.6), (22.25, -41.6), (20.1, -43.75), align=None)
    extrude(amount=CUT_EXTRUDE13_DEPTH, both=True, mode=Mode.SUBTRACT)

    # Sketch22 → Cut-Extrude14 (cut, symmetric)
    with BuildSketch(Plane(origin=(0, 0, 0), x_dir=(0, 0, -1), z_dir=(1, 0, 0)).offset(CUT_EXTRUDE14_START)):
        with Locations((5.5, -24)):
            Rectangle(SKETCH22_W, SKETCH22_H)
    extrude(amount=CUT_EXTRUDE14_DEPTH, both=True, mode=Mode.SUBTRACT)

    # Sketch23 → Cut-Extrude15 (cut, symmetric)
    with BuildSketch(Plane(origin=(0, 0, 0), x_dir=(0, 0, -1), z_dir=(1, 0, 0)).offset(CUT_EXTRUDE15_START)):
        with Locations((19.25, -24)):
            Circle(SKETCH23_R)
    extrude(amount=CUT_EXTRUDE15_DEPTH, both=True, mode=Mode.SUBTRACT)

    # Sketch24 → Cut-Extrude16 (cut, symmetric)
    with BuildSketch(Plane(origin=(0, 0, 0), x_dir=(0, 0, -1), z_dir=(1, 0, 0)).offset(CUT_EXTRUDE16_START)):
        with Locations((18.175, -24)):
            Rectangle(SKETCH24_W, SKETCH24_H)
    extrude(amount=CUT_EXTRUDE16_DEPTH, both=True, mode=Mode.SUBTRACT)

    # Sketch25 → Cut-Extrude17 (cut, symmetric)
    with BuildSketch(Plane(origin=(0, 0, 0), x_dir=(0, 0, -1), z_dir=(1, 0, 0)).offset(CUT_EXTRUDE17_START)):
        with Locations((-8.25, -24)):
            Circle(SKETCH25_R)
    extrude(amount=CUT_EXTRUDE17_DEPTH, both=True, mode=Mode.SUBTRACT)

    # Sketch26 → Cut-Extrude18 (cut, symmetric)
    with BuildSketch(Plane(origin=(0, 0, 0), x_dir=(0, 0, -1), z_dir=(1, 0, 0)).offset(CUT_EXTRUDE18_START)):
        with Locations((-7.175, -24)):
            Rectangle(SKETCH26_W, SKETCH26_H)
    extrude(amount=CUT_EXTRUDE18_DEPTH, both=True, mode=Mode.SUBTRACT)

    # Sketch27 → Cut-Extrude19 (cut, symmetric)
    with BuildSketch(Plane(origin=(0, 0, 0), x_dir=(0, 0, -1), z_dir=(1, 0, 0)).offset(CUT_EXTRUDE19_START)):
        with Locations((0, -24)):
            Circle(SKETCH27_R)
    extrude(amount=CUT_EXTRUDE19_DEPTH, both=True, mode=Mode.SUBTRACT)

    # Sketch28 → Cut-Extrude20 (cut, symmetric)
    with BuildSketch(Plane.XY.offset(CUT_EXTRUDE20_START)):
        with Locations((-65.4, -24)):
            Rectangle(SKETCH28_W, SKETCH28_H)
    extrude(amount=CUT_EXTRUDE20_DEPTH, both=True, mode=Mode.SUBTRACT)

    # Sketch29 → Cut-Extrude21 (cut, symmetric)
    with BuildSketch(Plane.XY.offset(CUT_EXTRUDE21_START)):
        with Locations((-65.4, -24)):
            Rectangle(SKETCH29_W, SKETCH29_H)
    extrude(amount=CUT_EXTRUDE21_DEPTH, both=True, mode=Mode.SUBTRACT)

    # Sketch30 → Cut-Extrude22 (cut, symmetric)
    with BuildSketch(Plane(origin=(0, 0, 0), x_dir=(0, 0, -1), z_dir=(1, 0, 0)).offset(CUT_EXTRUDE22_START)):
        with Locations((0, -24)):
            Circle(SKETCH30_R)
    extrude(amount=CUT_EXTRUDE22_DEPTH, both=True, mode=Mode.SUBTRACT)


solid = part_1.part
